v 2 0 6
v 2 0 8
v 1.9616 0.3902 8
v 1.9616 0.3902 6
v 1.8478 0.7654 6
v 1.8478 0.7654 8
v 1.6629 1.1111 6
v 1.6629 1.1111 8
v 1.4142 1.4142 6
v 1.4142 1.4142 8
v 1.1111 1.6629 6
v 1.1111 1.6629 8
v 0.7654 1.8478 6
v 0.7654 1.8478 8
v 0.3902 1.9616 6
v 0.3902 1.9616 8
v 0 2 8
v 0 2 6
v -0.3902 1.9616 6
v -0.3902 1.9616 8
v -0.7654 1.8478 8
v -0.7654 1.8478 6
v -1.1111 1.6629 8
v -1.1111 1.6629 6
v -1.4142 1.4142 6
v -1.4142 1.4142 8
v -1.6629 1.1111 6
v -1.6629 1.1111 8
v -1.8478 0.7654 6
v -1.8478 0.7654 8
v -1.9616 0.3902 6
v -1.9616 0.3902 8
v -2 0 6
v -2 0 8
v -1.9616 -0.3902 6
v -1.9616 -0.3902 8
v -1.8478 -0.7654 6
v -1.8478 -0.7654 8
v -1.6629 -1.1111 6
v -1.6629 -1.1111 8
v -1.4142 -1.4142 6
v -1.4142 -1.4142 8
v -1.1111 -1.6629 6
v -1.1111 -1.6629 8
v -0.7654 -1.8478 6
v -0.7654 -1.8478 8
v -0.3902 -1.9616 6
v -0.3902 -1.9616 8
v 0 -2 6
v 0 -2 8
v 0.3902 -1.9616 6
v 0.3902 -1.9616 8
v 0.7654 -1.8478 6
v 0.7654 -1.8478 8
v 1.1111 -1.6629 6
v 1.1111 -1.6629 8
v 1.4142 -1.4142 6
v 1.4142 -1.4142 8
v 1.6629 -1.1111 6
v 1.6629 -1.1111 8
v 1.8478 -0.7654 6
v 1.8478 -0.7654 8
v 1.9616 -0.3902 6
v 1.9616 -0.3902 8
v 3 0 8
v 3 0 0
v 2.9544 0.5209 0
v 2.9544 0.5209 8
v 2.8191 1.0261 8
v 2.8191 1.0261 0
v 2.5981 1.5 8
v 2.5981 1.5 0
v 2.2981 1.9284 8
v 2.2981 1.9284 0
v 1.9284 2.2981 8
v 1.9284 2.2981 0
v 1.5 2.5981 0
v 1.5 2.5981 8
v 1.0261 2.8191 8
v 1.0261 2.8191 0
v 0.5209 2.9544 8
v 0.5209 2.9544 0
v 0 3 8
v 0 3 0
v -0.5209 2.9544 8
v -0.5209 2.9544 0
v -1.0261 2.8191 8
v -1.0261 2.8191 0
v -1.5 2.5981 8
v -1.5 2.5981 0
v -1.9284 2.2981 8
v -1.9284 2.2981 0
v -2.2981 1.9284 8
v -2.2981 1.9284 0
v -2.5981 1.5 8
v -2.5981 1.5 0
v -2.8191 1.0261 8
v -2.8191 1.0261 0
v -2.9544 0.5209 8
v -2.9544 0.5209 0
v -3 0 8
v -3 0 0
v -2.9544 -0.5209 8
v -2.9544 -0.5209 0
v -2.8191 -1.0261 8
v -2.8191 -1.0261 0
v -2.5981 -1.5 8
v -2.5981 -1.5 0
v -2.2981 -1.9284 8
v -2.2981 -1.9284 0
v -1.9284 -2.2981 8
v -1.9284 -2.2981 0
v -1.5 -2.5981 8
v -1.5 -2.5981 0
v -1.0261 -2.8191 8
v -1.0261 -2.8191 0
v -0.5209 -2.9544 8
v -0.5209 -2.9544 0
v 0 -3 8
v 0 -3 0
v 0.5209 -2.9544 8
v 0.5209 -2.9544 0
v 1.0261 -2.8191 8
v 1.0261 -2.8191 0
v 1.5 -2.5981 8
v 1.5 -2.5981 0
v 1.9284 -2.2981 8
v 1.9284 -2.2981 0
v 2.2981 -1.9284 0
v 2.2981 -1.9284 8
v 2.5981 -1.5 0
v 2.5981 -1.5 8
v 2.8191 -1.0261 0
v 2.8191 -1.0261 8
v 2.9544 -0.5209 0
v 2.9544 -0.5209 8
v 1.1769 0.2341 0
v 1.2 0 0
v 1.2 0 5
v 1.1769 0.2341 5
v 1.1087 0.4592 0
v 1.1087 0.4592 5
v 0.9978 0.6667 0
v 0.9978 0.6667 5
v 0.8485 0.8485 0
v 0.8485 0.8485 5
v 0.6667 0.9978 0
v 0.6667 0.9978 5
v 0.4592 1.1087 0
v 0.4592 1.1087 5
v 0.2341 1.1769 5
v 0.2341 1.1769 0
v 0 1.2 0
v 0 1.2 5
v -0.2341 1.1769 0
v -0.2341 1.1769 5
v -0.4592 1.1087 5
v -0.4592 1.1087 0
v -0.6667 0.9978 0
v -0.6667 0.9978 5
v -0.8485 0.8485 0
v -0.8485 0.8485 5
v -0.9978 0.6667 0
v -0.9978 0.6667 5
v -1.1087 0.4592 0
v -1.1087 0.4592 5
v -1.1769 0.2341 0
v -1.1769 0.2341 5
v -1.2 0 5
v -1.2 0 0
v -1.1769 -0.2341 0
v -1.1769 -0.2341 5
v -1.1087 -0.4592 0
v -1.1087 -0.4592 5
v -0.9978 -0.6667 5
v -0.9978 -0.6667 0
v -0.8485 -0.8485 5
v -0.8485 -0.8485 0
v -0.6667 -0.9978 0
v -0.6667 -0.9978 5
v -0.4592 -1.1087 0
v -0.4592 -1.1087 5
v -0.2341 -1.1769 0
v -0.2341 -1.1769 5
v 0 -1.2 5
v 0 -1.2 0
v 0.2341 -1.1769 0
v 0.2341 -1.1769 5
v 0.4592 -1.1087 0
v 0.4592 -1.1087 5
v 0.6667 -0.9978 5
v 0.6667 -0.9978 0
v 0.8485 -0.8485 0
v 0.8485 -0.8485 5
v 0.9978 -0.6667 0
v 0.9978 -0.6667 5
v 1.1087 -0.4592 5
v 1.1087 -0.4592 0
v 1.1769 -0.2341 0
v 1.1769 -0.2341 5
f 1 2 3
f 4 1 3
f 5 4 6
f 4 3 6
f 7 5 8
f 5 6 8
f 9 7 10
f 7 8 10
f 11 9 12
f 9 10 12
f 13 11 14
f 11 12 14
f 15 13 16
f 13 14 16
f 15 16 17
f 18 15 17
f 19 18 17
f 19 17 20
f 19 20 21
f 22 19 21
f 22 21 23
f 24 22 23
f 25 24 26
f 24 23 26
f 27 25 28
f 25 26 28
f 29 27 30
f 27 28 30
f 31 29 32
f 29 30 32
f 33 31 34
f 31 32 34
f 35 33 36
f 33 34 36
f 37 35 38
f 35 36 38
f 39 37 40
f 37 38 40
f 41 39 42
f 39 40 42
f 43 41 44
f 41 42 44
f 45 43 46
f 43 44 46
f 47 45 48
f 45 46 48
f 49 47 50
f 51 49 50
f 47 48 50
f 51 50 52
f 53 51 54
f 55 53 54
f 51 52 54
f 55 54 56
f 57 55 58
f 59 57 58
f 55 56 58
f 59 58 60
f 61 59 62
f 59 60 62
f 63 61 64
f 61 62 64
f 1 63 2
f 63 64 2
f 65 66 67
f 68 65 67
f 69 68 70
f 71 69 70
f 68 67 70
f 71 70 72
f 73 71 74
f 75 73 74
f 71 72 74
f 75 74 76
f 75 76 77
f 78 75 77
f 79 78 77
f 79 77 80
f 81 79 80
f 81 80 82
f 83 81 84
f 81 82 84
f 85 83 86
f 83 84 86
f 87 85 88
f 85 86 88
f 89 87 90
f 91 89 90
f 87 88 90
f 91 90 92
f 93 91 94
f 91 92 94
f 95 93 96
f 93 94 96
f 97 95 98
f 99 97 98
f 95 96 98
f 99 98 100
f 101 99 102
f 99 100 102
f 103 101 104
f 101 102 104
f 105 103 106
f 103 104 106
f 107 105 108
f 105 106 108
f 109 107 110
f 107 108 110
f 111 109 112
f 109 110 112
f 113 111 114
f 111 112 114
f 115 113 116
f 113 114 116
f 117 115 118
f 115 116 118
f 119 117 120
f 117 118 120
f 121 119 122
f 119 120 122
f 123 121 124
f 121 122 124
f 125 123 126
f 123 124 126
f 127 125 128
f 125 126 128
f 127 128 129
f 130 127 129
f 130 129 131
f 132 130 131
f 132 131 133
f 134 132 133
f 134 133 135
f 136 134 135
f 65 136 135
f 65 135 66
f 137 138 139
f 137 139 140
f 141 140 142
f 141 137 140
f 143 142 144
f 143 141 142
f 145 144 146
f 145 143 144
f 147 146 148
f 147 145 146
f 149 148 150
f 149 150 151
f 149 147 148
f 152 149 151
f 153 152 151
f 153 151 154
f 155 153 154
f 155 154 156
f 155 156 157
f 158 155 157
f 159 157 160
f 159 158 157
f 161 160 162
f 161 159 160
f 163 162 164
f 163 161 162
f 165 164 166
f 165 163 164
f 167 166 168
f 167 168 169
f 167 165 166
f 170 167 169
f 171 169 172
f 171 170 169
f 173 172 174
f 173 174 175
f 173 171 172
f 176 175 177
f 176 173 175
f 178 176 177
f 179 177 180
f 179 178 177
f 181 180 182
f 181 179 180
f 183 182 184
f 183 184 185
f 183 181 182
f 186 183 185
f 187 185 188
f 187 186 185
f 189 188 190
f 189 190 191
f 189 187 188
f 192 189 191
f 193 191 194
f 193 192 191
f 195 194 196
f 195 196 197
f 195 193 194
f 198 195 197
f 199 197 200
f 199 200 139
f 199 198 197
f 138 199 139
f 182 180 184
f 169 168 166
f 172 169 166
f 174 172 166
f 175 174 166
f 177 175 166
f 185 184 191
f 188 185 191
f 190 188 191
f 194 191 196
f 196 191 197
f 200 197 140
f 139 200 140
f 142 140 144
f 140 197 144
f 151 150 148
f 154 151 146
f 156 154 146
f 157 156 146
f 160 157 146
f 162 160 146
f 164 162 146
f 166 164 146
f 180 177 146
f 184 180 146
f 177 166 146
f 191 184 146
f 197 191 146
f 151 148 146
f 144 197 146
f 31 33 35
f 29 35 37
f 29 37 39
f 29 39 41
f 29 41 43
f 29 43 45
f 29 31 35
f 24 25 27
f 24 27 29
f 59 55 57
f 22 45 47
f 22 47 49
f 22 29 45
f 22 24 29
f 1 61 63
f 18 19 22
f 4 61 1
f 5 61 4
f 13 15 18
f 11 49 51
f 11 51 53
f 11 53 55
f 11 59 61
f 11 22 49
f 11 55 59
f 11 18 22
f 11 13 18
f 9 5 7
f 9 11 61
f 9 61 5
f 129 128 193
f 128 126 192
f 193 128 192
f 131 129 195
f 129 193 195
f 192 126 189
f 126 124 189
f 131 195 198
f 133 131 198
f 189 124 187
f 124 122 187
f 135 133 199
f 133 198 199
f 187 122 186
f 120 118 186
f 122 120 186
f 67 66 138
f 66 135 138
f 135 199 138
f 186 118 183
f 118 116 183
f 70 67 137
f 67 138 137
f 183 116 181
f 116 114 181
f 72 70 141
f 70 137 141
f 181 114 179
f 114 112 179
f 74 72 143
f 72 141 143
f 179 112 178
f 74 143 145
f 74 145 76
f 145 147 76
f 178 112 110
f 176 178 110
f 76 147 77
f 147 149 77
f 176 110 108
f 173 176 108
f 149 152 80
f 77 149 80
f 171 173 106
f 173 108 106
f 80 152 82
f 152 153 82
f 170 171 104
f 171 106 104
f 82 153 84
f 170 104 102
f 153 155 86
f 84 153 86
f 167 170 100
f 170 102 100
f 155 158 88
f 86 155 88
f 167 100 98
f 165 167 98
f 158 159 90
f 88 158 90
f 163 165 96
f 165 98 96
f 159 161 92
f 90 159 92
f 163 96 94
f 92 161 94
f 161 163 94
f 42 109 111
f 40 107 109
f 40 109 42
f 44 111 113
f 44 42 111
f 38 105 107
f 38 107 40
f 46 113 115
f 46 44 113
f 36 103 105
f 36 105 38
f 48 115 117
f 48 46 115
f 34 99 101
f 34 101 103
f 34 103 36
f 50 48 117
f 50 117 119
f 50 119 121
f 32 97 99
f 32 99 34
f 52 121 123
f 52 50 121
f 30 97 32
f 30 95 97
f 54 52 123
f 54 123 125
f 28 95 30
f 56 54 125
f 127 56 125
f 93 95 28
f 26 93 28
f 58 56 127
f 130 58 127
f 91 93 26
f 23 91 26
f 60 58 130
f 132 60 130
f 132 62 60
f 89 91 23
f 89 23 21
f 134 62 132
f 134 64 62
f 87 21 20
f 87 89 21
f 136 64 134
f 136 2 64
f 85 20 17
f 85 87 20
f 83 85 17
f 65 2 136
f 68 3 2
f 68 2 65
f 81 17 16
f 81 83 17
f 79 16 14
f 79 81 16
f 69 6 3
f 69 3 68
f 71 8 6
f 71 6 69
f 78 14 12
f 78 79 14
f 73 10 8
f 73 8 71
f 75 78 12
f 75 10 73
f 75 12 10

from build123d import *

# Parameters (mm, degrees)
SKETCH1_R           = 3
SKETCH1_R_2         = 2
SKETCH1_R_3         = 1.2
BOSS_EXTRUDE1_DEPTH = 8
CUT_EXTRUDE1_START  = 8
SKETCH1_3_R         = 2
SKETCH1_3_R_2       = 1.2
CUT_EXTRUDE1_DEPTH  = 2
SKETCH1_4_R         = 1.2
CUT_EXTRUDE2_DEPTH  = 5


with BuildPart() as part:
    # Sketch1 → Boss-Extrude1 (new body)
    # profile 1 of 3: a face of its own
    with BuildSketch(Plane(origin=(0, 0, 0), x_dir=(0, 1, 0), z_dir=(0, 0, 1))):
        with Locations(Location((0, 0, 0), (0, 0, 270))):
            Circle(SKETCH1_R)
        Circle(SKETCH1_R_2, mode=Mode.SUBTRACT)
    # profile 2 of 3: a face of its own
    with BuildSketch(Plane(origin=(0, 0, 0), x_dir=(0, 1, 0), z_dir=(0, 0, 1))):
        Circle(SKETCH1_R_2)
        Circle(SKETCH1_R_3, mode=Mode.SUBTRACT)
    # profile 3 of 3: a face of its own
    with BuildSketch(Plane(origin=(0, 0, 0), x_dir=(0, 1, 0), z_dir=(0, 0, 1))):
        Circle(SKETCH1_R_3)
    extrude(amount=BOSS_EXTRUDE1_DEPTH)

    # Sketch1<3> → Cut-Extrude1 (cut)
    # profile 1 of 2: a face of its own
    with BuildSketch(Plane(origin=(0, 0, 0), x_dir=(0, 1, 0), z_dir=(0, 0, 1)).offset(CUT_EXTRUDE1_START)):
        with Locations(Location((0, 0, 0), (0, 0, 270))):
            Circle(SKETCH1_3_R)
        Circle(SKETCH1_3_R_2, mode=Mode.SUBTRACT)
    # profile 2 of 2: a face of its own
    with BuildSketch(Plane(origin=(0, 0, 0), x_dir=(0, 1, 0), z_dir=(0, 0, 1)).offset(CUT_EXTRUDE1_START)):
        Circle(SKETCH1_3_R_2)
    extrude(amount=-CUT_EXTRUDE1_DEPTH, mode=Mode.SUBTRACT)

    # Sketch1<4> → Cut-Extrude2 (cut)
    with BuildSketch(Plane(origin=(0, 0, 0), x_dir=(0, 1, 0), z_dir=(0, 0, 1))):
        with Locations(Location((0, 0, 0), (0, 0, 270))):
            Circle(SKETCH1_4_R)
    extrude(amount=CUT_EXTRUDE2_DEPTH, mode=Mode.SUBTRACT)


solid = part.part
